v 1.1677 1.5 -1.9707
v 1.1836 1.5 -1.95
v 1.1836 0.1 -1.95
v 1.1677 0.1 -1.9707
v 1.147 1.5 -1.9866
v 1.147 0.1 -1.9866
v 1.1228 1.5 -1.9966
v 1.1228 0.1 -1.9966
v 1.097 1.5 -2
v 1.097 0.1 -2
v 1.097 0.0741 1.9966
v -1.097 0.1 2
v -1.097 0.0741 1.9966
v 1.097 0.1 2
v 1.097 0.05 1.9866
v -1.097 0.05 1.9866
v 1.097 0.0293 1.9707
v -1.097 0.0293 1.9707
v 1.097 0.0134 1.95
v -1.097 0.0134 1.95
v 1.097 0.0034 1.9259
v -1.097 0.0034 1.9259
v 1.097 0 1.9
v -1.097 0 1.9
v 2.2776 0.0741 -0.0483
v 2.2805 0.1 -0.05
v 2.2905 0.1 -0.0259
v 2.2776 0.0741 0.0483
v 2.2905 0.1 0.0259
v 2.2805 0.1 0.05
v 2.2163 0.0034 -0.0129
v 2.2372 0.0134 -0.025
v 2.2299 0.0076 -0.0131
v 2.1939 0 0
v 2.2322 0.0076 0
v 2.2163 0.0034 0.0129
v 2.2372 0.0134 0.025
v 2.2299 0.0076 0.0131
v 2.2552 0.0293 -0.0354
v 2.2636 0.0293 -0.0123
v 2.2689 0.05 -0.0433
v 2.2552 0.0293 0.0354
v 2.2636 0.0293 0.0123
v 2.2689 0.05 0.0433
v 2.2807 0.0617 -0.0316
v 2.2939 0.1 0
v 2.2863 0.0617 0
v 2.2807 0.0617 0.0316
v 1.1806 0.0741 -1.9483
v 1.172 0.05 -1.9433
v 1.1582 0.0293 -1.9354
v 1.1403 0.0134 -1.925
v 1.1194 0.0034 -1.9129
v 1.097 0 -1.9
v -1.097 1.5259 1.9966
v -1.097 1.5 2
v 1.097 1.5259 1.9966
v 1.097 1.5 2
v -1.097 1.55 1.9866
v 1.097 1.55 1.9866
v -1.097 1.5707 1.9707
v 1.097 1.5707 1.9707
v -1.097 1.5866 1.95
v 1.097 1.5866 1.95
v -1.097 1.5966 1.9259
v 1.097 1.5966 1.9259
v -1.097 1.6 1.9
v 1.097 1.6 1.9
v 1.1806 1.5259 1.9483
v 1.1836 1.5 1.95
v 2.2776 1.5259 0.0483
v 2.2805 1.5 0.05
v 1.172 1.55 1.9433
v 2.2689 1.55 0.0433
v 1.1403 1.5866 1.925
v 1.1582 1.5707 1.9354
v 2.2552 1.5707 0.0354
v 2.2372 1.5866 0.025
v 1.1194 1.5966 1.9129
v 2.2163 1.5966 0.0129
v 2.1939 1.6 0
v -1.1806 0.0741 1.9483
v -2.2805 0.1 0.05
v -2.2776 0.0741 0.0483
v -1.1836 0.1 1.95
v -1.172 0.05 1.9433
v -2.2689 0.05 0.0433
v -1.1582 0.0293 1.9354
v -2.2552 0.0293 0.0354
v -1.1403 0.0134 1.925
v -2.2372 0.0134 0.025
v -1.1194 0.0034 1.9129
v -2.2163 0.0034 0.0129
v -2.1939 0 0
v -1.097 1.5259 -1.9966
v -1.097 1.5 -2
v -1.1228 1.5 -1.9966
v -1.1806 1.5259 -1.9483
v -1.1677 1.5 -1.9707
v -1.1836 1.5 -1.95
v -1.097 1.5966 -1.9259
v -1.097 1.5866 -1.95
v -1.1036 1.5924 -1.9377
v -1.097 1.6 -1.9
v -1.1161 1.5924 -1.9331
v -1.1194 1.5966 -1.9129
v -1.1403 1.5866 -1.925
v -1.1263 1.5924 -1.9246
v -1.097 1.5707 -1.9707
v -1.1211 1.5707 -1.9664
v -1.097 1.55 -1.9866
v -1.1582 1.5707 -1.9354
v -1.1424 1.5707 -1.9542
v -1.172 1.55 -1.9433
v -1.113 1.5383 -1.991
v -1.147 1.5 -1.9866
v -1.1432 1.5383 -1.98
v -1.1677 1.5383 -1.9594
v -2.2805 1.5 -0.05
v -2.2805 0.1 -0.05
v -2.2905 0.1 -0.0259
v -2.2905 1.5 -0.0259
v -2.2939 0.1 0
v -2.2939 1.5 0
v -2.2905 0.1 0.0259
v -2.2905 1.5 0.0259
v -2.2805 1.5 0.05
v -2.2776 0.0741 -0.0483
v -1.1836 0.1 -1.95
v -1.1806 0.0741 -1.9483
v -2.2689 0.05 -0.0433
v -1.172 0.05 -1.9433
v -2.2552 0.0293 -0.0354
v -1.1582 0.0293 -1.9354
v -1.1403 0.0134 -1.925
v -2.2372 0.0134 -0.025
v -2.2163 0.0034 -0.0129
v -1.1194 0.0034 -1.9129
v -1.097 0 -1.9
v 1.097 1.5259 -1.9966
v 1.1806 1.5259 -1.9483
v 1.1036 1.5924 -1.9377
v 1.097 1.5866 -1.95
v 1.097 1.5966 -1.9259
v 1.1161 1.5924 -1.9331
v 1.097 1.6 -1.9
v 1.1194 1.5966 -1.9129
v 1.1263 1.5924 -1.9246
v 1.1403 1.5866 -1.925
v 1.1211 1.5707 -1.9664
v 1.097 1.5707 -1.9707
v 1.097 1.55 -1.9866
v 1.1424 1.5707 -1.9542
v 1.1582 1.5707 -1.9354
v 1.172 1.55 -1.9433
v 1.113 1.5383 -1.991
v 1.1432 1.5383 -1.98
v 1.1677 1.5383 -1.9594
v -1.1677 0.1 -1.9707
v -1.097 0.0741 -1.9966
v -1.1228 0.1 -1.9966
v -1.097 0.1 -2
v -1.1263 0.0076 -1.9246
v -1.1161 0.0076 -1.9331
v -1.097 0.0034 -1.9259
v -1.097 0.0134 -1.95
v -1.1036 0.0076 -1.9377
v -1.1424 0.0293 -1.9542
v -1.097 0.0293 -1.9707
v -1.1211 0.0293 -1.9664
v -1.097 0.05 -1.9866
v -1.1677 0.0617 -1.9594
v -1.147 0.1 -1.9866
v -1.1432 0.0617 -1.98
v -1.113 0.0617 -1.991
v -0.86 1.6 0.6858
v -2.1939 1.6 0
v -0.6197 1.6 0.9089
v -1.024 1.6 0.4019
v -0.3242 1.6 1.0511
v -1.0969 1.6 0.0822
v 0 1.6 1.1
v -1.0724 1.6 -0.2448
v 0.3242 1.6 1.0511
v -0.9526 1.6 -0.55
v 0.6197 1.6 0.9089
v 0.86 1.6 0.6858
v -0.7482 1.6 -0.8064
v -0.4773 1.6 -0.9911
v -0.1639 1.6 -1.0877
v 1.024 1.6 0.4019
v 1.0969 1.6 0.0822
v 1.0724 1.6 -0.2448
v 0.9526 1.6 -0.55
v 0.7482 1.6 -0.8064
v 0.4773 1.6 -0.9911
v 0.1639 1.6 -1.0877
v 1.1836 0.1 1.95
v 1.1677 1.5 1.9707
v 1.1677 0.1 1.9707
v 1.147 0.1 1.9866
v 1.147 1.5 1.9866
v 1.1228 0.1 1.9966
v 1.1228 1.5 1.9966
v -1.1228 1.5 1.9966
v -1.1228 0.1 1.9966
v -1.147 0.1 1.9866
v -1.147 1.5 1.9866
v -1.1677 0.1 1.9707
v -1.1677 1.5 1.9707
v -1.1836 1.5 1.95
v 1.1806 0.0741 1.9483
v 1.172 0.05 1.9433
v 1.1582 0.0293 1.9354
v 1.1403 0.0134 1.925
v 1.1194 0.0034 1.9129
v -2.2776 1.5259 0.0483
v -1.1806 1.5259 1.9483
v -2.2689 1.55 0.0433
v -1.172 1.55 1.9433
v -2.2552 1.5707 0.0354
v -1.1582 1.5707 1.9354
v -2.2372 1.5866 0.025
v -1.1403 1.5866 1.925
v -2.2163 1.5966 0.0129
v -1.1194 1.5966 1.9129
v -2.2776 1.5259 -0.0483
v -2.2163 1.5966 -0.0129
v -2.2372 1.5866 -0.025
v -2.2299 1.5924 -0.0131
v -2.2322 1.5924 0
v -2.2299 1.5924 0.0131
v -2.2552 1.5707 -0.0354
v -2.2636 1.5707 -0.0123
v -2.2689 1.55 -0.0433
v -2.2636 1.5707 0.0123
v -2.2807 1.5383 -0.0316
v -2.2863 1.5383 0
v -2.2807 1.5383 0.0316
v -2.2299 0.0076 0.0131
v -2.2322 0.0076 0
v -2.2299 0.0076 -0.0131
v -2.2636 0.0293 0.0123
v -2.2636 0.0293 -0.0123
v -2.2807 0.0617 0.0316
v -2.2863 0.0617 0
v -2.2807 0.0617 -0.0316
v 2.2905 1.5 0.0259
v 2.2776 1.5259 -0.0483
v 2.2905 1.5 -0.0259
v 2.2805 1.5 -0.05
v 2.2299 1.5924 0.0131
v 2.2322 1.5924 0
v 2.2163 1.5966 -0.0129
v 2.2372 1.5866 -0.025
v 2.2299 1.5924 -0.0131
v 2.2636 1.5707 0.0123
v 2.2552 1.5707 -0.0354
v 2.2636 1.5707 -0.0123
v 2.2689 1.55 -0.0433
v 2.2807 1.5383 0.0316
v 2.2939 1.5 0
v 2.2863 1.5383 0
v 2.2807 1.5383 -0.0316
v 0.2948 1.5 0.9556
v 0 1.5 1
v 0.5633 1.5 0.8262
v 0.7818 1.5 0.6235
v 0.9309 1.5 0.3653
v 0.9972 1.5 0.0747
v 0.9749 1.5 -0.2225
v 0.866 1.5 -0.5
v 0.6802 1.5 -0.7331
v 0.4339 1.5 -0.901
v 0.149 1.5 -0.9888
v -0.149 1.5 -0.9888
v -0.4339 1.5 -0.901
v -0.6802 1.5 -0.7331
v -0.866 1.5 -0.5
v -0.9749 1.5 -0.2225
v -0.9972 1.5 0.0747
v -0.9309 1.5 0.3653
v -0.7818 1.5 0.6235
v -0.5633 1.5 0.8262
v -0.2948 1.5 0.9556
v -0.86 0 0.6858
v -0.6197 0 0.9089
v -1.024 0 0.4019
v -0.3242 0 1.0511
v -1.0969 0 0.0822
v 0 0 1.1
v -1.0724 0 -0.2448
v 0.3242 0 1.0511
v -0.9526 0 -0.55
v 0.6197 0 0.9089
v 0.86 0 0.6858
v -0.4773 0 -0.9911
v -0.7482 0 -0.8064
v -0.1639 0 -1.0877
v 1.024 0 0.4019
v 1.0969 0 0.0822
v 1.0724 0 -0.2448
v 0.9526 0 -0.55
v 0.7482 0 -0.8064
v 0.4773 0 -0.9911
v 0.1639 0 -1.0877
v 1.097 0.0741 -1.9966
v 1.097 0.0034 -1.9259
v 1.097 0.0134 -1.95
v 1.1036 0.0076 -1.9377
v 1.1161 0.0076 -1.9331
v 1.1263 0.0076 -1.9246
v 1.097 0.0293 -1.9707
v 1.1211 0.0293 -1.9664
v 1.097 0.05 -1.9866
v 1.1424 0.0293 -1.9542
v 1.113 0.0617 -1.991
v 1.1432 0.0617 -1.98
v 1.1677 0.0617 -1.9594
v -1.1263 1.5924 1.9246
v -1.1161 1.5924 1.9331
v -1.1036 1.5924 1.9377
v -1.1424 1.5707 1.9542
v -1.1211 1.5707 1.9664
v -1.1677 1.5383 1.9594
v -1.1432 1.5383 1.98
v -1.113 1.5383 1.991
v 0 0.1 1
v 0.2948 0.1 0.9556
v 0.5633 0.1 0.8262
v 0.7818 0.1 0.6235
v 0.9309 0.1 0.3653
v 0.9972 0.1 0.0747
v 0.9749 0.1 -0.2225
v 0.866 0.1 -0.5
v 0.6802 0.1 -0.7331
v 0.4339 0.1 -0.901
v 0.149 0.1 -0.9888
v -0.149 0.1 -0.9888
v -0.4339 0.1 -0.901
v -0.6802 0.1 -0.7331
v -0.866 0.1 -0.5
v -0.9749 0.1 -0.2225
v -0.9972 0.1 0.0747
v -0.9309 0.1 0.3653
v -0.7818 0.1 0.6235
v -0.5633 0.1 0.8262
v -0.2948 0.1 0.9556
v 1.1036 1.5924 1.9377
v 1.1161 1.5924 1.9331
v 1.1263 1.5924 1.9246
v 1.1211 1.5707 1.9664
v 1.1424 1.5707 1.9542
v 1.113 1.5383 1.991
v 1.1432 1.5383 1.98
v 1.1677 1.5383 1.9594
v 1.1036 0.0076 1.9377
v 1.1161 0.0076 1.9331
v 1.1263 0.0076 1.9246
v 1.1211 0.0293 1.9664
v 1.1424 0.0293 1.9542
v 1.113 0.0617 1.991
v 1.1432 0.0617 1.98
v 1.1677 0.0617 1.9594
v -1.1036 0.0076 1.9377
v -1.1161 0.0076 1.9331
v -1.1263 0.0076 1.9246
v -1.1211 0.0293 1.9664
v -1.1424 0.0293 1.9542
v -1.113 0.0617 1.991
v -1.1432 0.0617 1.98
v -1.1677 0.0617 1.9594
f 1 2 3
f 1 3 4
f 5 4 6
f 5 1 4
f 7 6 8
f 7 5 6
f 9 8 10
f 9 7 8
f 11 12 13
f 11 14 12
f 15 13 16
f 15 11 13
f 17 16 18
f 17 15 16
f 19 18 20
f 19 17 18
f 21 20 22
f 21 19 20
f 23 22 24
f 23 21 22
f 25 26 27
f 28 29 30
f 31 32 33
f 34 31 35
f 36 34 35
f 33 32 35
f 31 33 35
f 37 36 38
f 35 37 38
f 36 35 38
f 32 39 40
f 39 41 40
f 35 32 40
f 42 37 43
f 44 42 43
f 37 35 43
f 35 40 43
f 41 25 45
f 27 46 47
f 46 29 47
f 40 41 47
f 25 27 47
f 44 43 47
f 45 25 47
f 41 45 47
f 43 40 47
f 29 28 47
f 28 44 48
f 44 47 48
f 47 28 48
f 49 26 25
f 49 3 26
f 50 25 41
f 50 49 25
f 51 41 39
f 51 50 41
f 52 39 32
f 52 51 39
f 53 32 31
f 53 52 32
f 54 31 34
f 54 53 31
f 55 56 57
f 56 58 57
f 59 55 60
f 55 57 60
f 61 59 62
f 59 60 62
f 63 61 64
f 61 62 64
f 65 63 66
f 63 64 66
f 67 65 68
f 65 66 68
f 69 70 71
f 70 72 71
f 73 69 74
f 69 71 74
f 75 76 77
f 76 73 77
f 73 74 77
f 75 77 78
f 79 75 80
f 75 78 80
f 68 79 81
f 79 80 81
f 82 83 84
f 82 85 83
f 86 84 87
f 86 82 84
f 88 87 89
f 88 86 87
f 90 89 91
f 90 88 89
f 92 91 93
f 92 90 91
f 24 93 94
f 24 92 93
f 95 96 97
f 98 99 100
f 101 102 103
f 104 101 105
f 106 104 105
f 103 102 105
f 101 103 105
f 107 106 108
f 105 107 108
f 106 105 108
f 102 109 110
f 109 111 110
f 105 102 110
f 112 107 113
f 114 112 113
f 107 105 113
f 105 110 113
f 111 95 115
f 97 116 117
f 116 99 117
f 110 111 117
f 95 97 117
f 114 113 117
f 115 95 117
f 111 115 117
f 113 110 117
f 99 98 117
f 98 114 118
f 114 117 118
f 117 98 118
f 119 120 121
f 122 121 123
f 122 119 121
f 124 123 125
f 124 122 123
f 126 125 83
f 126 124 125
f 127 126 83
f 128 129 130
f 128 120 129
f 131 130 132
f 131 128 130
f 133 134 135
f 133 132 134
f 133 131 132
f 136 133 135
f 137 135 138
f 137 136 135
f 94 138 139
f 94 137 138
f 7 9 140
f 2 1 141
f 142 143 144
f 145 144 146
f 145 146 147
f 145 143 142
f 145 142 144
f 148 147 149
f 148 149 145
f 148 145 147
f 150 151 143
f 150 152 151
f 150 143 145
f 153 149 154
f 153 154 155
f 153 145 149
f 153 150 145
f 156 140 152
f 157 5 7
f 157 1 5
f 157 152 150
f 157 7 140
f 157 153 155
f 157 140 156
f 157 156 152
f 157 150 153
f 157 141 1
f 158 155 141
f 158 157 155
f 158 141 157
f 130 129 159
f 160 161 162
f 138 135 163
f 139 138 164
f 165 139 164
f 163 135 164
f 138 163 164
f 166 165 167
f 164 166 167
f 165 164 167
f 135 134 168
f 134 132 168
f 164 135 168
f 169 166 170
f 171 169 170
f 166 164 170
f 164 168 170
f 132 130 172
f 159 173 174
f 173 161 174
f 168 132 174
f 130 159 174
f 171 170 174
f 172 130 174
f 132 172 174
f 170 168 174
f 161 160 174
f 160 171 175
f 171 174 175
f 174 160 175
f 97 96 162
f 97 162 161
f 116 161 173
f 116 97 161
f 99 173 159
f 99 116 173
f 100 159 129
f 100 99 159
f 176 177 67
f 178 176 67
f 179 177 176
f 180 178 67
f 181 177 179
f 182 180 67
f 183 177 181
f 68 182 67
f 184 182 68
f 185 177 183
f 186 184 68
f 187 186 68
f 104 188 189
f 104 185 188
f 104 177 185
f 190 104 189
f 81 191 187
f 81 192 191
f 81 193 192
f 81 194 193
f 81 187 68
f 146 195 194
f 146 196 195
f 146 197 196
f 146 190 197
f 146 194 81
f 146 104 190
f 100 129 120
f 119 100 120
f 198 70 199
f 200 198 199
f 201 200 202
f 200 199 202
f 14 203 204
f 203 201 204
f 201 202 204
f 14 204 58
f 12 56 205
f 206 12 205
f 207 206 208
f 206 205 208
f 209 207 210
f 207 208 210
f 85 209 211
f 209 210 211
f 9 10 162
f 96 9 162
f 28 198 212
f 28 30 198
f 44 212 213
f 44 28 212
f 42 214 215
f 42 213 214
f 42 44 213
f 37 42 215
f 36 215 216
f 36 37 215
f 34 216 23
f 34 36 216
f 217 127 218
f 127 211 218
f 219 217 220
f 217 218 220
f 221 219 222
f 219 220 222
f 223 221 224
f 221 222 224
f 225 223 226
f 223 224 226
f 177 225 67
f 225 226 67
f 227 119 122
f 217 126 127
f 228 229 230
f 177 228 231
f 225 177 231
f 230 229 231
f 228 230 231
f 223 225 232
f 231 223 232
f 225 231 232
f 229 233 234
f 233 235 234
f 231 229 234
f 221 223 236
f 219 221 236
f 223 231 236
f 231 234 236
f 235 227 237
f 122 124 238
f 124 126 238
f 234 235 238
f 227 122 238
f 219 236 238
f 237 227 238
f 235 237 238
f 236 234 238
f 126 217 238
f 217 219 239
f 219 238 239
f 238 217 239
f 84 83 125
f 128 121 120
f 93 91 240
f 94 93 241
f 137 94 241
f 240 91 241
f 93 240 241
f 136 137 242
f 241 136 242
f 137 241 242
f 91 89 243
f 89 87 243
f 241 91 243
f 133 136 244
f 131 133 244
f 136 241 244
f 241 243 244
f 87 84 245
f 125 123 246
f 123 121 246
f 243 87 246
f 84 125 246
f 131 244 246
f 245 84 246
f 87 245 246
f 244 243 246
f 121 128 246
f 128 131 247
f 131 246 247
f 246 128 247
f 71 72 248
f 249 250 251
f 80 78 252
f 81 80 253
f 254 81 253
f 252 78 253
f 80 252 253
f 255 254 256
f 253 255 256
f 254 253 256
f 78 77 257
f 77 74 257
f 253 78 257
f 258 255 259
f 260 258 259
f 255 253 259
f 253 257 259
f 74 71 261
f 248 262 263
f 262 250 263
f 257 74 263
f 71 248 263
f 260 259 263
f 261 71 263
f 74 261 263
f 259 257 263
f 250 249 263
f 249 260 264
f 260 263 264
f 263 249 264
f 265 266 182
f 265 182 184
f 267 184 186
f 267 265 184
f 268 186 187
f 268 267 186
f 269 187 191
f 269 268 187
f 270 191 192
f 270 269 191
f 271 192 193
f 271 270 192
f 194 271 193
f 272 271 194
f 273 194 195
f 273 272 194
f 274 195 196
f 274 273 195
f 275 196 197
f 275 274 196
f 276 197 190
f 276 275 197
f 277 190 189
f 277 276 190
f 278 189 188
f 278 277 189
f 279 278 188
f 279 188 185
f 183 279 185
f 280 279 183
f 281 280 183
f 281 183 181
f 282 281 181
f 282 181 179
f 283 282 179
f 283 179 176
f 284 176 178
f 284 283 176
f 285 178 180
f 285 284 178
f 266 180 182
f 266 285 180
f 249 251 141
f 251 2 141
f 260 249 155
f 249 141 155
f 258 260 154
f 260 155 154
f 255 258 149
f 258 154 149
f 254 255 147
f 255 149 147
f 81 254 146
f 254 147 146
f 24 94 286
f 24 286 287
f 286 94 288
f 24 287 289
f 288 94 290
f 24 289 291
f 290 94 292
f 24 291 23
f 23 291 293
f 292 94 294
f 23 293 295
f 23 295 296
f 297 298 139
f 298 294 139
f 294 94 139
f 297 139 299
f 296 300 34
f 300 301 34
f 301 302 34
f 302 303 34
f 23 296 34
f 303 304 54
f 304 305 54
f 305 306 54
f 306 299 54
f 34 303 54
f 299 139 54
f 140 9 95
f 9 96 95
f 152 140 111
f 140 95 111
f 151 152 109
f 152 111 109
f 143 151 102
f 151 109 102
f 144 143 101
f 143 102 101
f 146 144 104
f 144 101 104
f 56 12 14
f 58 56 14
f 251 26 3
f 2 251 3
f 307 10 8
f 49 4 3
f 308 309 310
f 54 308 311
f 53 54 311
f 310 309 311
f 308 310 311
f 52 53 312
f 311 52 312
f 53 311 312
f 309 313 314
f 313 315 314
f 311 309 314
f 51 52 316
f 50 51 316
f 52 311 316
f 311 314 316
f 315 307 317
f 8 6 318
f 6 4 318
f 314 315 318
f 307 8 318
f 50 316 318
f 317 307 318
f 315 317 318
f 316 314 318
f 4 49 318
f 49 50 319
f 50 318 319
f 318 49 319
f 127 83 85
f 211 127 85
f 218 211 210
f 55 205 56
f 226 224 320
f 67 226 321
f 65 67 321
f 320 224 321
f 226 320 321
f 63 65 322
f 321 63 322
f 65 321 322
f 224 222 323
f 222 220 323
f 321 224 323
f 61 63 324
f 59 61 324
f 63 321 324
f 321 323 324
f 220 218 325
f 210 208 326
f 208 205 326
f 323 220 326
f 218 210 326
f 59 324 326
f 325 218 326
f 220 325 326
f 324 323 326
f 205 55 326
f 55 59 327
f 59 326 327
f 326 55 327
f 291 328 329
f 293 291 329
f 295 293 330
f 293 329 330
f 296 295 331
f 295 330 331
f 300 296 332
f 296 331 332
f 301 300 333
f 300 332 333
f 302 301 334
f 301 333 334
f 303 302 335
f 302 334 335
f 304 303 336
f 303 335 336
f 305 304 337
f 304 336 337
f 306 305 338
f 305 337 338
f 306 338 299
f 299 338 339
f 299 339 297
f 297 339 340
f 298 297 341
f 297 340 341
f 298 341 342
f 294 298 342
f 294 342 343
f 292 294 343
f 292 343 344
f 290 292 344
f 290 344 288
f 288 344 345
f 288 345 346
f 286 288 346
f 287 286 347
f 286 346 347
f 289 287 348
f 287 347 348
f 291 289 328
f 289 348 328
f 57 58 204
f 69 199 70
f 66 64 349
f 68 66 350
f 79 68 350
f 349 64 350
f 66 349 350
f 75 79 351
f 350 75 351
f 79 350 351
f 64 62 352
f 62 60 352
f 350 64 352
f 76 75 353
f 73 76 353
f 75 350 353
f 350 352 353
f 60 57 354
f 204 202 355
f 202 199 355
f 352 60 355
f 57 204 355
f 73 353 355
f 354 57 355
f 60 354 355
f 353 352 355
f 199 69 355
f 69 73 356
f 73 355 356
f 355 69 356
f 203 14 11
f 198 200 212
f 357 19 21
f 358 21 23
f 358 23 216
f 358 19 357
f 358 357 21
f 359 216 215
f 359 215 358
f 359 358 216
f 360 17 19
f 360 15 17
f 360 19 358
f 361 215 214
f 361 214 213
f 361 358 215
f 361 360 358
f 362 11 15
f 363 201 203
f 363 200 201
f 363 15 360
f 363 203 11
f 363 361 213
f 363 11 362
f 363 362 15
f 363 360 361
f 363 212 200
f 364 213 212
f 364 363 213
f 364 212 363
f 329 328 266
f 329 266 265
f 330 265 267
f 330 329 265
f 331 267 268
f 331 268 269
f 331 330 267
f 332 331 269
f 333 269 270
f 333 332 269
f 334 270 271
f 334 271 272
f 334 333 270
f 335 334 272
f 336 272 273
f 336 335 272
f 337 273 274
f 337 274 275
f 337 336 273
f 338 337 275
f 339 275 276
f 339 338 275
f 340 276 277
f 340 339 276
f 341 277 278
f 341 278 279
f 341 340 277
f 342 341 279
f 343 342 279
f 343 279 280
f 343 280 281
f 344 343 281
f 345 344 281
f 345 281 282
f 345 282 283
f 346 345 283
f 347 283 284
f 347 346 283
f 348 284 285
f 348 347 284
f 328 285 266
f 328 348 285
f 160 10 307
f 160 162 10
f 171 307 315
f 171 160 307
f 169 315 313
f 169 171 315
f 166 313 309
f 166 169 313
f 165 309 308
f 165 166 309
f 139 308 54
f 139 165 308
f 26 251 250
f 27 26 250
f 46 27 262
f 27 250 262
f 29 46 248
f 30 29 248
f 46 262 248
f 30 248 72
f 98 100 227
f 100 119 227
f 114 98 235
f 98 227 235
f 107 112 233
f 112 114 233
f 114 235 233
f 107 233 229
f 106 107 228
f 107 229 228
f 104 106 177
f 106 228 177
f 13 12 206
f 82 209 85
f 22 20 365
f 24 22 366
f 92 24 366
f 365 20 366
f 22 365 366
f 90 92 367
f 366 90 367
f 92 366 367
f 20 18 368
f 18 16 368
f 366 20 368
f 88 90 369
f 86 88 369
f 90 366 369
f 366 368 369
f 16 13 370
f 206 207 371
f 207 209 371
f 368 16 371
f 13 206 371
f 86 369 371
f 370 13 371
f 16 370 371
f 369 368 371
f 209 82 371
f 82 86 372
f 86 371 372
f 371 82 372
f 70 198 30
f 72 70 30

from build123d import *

# Parameters (mm, degrees)
SKETCH_2_R      = 1
EXTRUDE_1_DEPTH = 1.6
FILLET_1_R      = 0.1
CHAMFER_1_SIZE  = 0.1


with BuildPart() as part:
    # 草图2 → 凸台-拉伸1 (new body)
    with BuildSketch(Plane(origin=(0, 0, 0), x_dir=(1, 0, 0), z_dir=(0, 1, 0))):
        Polygon((2.309401077, 0), (1.154700538, 2), (-1.154700538, 2), (-2.309401077, 0), (-1.154700538, -2), (1.154700538, -2), align=None)
        with Locations(Location((0, 0, 0), (0, 0, 270))):
            Circle(SKETCH_2_R, mode=Mode.SUBTRACT)
    extrude(amount=EXTRUDE_1_DEPTH)

    # 圆角1
    fillet_1_edges = [part.edges().sort_by_distance(p)[0] for p in [
        (1.154700538, 0.8, 2),
        (-1.154700538, 0.8, 2),
        (-2.309401077, 0.8, 0),
        (-1.154700538, 0.8, -2),
        (1.154700538, 0.8, -2),
        (2.309401077, 0.8, 0),
        (0, 1.6, -2),
        (-1.732050808, 1.6, -1),
        (-1.732050808, 1.6, 1),
        (0, 1.6, 2),
        (1.732050808, 1.6, 1),
        (0, 0, 2),
        (-1.732050808, 0, 1),
        (-1.732050808, 0, -1),
        (0, 0, -2),
        (1.732050808, 0, -1),
        (1.732050808, 0, 1),
        (1.732050808, 1.6, -1),
    ]]
    fillet(fillet_1_edges, radius=FILLET_1_R)

    # 倒角1
    chamfer_1_edges = [part.edges().sort_by_distance(p)[0] for p in [
        (0, 0, -1),
        (0, 1.6, -1),
    ]]
    chamfer(chamfer_1_edges, length=CHAMFER_1_SIZE)


solid = part.part
